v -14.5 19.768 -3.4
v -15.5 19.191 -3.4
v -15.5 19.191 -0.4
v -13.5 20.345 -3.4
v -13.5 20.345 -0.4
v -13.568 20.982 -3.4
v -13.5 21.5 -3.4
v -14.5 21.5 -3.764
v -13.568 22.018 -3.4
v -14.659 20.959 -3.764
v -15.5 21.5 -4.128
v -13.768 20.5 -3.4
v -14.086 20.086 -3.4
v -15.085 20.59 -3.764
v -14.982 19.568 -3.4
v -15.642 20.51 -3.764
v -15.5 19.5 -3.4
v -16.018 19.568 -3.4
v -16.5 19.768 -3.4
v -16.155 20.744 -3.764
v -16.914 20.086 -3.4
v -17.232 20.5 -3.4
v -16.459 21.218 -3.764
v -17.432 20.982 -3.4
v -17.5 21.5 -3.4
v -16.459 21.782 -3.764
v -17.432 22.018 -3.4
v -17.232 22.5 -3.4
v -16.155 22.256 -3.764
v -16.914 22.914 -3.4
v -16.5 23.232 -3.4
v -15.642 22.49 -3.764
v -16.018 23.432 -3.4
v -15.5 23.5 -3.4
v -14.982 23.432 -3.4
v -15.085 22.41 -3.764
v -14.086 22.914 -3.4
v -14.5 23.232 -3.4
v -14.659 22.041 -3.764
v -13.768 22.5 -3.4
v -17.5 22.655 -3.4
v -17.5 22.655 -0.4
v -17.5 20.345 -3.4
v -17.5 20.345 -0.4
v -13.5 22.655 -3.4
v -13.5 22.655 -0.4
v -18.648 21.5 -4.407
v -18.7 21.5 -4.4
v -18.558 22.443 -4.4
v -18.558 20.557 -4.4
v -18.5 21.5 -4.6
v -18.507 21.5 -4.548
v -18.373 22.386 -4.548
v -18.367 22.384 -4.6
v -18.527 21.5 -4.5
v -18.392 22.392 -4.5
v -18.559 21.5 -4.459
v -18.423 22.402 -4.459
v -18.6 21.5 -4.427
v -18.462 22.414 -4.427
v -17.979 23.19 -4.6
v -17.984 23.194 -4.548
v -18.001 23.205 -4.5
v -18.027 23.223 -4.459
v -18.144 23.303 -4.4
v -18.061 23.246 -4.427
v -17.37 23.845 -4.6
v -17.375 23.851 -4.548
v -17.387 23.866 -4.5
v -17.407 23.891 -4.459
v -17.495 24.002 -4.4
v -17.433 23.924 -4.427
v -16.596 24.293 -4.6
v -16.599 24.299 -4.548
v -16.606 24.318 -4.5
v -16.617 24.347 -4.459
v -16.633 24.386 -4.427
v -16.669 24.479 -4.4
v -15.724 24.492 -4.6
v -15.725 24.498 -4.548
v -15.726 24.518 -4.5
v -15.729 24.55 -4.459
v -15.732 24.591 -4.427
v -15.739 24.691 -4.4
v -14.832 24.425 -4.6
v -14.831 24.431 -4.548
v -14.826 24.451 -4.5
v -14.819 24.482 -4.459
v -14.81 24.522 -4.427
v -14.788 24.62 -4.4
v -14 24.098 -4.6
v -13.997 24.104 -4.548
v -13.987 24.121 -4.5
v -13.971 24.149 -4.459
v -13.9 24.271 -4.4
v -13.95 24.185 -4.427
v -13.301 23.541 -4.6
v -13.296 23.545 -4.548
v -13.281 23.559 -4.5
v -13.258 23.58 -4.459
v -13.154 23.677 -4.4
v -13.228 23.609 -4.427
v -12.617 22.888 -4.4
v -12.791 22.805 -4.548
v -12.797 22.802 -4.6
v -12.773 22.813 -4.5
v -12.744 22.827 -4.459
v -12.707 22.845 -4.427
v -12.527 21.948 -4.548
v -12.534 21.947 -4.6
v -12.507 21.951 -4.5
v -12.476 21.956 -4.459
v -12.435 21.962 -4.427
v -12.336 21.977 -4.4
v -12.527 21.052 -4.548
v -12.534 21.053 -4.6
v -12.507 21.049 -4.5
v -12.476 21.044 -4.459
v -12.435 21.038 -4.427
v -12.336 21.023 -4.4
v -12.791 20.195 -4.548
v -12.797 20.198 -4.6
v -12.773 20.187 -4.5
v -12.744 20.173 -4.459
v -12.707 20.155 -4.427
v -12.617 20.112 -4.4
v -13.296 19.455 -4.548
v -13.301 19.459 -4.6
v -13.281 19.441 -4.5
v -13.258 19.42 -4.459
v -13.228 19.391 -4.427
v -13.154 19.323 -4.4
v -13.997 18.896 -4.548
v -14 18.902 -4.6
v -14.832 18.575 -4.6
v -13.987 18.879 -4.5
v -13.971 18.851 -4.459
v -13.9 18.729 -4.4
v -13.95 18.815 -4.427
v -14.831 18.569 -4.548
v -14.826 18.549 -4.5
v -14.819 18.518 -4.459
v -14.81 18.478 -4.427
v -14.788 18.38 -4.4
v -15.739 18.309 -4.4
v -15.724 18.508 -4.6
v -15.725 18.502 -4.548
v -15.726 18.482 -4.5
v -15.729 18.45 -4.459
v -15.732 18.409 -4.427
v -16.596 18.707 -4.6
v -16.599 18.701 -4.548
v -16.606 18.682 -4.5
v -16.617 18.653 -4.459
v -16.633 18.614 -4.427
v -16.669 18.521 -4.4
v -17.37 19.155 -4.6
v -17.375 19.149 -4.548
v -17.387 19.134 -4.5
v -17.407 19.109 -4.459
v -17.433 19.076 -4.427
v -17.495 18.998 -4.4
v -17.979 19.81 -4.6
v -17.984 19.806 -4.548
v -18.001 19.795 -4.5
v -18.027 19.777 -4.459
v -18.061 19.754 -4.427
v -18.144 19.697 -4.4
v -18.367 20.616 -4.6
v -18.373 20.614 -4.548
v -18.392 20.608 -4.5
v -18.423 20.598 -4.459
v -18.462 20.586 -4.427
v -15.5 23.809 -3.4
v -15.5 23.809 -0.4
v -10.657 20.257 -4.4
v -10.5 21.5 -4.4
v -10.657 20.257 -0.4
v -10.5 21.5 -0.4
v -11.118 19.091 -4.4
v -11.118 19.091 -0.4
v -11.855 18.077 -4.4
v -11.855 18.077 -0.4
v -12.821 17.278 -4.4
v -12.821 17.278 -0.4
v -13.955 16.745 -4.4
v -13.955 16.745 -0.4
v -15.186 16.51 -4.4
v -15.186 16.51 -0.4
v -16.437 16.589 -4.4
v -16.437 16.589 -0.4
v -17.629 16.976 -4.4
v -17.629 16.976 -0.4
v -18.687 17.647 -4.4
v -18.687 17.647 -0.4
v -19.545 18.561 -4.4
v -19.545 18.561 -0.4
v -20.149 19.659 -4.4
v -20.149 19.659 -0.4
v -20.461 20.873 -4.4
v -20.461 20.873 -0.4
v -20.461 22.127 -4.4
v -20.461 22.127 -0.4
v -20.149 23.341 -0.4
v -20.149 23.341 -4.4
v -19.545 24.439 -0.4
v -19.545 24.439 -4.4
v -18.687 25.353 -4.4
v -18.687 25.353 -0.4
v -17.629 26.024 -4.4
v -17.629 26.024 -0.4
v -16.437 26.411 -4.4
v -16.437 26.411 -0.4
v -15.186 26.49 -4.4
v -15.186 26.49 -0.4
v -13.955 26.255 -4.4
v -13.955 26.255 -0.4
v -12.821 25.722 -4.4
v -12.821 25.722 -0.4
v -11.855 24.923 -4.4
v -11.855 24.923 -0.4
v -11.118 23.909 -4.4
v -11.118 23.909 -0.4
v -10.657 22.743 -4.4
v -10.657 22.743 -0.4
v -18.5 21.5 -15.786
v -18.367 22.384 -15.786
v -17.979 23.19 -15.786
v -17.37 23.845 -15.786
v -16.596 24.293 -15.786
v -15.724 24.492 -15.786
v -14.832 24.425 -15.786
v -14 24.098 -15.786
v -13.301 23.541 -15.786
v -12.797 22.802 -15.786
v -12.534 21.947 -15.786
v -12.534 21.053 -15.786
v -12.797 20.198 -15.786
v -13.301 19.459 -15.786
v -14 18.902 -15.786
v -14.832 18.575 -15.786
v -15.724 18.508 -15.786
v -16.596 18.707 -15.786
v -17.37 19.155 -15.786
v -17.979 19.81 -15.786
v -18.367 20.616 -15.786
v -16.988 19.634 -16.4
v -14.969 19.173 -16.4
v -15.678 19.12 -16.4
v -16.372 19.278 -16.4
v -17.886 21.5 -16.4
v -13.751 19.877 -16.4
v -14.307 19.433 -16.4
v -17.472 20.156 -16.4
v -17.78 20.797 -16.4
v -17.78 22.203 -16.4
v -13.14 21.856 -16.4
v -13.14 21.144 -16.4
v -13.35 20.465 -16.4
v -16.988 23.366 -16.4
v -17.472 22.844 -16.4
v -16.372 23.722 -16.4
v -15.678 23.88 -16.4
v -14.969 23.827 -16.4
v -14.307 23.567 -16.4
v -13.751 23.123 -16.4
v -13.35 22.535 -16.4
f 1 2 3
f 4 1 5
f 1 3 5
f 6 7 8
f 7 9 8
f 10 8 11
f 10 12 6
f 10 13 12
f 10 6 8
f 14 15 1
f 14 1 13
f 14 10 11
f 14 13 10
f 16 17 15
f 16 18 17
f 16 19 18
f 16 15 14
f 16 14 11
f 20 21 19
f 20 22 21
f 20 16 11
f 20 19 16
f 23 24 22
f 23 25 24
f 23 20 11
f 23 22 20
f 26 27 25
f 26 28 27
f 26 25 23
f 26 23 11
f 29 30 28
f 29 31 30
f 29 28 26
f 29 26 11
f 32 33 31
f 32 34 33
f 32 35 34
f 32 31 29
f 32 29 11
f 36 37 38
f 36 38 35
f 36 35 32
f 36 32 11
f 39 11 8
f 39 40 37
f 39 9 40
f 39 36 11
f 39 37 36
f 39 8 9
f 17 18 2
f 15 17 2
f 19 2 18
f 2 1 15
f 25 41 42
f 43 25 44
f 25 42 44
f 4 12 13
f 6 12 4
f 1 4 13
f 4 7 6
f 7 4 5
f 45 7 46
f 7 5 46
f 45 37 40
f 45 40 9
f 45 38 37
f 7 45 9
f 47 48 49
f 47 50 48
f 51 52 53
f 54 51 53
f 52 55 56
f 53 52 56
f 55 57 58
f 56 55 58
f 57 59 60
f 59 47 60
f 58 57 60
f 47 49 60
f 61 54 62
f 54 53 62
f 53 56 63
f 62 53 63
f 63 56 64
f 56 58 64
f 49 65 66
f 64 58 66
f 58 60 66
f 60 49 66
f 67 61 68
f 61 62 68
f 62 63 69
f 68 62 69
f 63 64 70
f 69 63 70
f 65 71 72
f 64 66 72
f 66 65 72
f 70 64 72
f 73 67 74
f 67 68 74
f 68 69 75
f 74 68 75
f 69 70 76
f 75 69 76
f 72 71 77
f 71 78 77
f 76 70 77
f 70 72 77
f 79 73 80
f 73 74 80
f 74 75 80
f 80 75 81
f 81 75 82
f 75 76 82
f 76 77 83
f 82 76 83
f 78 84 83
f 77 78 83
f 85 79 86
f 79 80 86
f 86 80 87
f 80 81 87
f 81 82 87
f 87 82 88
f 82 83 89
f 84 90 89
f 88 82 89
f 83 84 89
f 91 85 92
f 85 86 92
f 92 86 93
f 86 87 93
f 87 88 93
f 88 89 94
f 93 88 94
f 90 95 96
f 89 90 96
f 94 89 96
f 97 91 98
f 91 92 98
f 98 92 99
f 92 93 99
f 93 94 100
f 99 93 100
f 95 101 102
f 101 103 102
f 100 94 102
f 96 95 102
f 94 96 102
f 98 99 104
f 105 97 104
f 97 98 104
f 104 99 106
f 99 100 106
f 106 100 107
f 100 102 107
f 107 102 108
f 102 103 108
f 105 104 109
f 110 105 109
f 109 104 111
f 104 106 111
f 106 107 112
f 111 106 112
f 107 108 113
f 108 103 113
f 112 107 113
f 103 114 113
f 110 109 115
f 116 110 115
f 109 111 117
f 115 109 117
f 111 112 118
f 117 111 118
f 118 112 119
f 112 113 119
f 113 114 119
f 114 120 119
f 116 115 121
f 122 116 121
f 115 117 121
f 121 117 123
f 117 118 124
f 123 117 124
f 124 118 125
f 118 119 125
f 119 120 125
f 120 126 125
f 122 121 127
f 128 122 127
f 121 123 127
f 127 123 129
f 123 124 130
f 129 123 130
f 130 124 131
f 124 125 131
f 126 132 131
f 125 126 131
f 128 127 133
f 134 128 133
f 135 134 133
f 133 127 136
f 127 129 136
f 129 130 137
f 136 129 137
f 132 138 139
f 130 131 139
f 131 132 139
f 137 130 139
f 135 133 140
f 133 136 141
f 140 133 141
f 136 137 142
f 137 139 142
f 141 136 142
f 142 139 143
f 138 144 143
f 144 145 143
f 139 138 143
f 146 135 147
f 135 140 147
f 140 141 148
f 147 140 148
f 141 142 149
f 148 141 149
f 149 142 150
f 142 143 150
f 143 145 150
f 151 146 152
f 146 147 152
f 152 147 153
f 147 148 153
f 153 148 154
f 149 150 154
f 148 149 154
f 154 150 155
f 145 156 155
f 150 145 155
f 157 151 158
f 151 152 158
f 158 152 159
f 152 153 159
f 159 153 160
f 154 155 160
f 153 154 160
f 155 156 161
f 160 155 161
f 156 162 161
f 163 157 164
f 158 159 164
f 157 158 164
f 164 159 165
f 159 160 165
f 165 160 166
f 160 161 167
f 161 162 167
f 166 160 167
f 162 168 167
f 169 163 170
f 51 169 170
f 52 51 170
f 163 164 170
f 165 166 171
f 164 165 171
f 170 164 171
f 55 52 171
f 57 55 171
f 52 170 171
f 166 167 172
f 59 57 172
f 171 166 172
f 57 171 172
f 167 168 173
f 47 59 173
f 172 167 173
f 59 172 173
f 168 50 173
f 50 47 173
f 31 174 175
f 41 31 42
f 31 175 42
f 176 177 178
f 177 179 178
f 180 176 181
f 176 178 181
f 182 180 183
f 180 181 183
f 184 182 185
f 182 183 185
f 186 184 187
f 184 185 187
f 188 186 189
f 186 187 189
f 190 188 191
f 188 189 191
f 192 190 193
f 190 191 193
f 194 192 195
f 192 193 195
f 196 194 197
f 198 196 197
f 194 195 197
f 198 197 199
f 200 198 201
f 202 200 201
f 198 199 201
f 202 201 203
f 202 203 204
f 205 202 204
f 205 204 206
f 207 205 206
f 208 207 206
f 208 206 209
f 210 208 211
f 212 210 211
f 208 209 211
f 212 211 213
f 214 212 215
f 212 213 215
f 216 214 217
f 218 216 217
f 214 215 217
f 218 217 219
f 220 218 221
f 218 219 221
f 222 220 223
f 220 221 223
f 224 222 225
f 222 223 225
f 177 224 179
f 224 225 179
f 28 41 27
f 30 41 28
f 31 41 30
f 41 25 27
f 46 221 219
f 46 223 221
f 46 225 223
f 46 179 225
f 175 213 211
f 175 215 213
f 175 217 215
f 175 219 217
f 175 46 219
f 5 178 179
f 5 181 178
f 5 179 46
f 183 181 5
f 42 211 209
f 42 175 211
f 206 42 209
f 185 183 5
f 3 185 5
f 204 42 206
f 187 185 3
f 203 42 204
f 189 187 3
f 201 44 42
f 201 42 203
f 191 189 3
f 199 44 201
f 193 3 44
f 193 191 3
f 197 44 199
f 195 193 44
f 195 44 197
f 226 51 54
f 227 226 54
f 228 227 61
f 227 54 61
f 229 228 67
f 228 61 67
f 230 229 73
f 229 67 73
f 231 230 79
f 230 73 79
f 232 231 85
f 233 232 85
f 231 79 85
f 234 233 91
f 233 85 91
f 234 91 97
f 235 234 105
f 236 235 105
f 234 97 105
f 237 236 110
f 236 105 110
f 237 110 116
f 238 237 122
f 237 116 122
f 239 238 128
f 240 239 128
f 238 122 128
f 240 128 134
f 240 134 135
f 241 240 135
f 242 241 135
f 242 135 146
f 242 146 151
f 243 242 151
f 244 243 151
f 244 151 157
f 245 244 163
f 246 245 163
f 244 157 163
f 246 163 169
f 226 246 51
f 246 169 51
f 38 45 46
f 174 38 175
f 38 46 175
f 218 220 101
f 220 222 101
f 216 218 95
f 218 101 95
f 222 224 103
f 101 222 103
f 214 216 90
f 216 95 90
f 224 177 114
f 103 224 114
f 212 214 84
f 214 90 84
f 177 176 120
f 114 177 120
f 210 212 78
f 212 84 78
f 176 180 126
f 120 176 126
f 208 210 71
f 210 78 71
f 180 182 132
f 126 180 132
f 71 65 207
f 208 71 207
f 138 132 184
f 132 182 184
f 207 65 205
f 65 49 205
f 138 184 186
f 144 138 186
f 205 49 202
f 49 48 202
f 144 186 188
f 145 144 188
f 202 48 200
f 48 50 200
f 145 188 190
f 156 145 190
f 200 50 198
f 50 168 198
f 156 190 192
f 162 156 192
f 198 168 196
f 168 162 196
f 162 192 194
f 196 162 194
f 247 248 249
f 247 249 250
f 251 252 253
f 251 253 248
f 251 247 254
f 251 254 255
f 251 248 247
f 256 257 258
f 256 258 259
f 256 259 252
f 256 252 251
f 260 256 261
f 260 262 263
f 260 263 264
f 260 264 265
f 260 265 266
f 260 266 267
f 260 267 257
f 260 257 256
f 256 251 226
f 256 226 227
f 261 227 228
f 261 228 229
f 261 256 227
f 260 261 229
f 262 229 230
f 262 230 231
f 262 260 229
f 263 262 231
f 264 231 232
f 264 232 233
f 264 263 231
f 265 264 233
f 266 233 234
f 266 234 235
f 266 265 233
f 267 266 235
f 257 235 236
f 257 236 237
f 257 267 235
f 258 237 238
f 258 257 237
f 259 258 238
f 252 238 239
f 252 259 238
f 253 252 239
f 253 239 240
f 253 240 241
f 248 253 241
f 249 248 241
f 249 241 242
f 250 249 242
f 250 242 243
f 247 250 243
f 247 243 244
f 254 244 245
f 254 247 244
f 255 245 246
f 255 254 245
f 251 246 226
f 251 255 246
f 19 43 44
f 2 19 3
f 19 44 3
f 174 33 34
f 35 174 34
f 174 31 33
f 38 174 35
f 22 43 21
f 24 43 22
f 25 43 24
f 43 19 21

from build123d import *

# Parameters (mm, degrees)
SKETCH1_W      = 5
SKETCH1_H      = 4
SKETCH2_R      = 3
EXTRUDE1_DEPTH = 12
EXTRUDE2_DEPTH = 3
CHAMFER1_SIZE  = 0.6135
FILLET1_R      = 0.2


with BuildPart() as part:
    # Sketch1 → Revolve1 (revolve)
    with BuildSketch(Plane.XZ.offset(-21.5)):
        with Locations((-13, -2.4)):
            Rectangle(SKETCH1_W, SKETCH1_H)
    revolve(axis=Axis((-15.5, 21.5, -0.4), (0, 0, -1)))

    # Sketch2 → Extrude1 (add)
    with BuildSketch(Plane(origin=(0, 0, -4.4), x_dir=(-1, 0, 0), z_dir=(0, 0, -1))):
        with Locations((15.5, 21.5)):
            Circle(SKETCH2_R)
    extrude(amount=EXTRUDE1_DEPTH)

    # Sketch3 → Extrude2 (cut)
    with BuildSketch(Plane.XY.offset(-0.4)):
        Polygon((-17.5, 22.654700538), (-17.5, 20.345299462), (-15.5, 19.190598923), (-13.5, 20.345299462), (-13.5, 22.654700538), (-15.5, 23.809401077), align=None)
    extrude(amount=-EXTRUDE2_DEPTH, mode=Mode.SUBTRACT)

    # Sketch4 → Cut-Revolve1 (revolve, cut)
    with BuildSketch(Plane.XZ.offset(-21.5)):
        Polygon((-13.5, -3.4), (-15.5, -3.4), (-15.5, -4.127940469), align=None)
    revolve(axis=Axis((-15.5, 21.5, -3.399975), (0, 0, -1)), mode=Mode.SUBTRACT)

    # Chamfer1
    chamfer1_edges = [part.edges().sort_by_distance(p)[0] for p in [
        (-12.5, 21.5, -16.4),
    ]]
    chamfer(chamfer1_edges, length=CHAMFER1_SIZE)

    # Fillet1
    fillet1_edges = [part.edges().sort_by_distance(p)[0] for p in [
        (-12.5, 21.5, -4.4),
    ]]
    fillet(fillet1_edges, radius=FILLET1_R)


solid = part.part
